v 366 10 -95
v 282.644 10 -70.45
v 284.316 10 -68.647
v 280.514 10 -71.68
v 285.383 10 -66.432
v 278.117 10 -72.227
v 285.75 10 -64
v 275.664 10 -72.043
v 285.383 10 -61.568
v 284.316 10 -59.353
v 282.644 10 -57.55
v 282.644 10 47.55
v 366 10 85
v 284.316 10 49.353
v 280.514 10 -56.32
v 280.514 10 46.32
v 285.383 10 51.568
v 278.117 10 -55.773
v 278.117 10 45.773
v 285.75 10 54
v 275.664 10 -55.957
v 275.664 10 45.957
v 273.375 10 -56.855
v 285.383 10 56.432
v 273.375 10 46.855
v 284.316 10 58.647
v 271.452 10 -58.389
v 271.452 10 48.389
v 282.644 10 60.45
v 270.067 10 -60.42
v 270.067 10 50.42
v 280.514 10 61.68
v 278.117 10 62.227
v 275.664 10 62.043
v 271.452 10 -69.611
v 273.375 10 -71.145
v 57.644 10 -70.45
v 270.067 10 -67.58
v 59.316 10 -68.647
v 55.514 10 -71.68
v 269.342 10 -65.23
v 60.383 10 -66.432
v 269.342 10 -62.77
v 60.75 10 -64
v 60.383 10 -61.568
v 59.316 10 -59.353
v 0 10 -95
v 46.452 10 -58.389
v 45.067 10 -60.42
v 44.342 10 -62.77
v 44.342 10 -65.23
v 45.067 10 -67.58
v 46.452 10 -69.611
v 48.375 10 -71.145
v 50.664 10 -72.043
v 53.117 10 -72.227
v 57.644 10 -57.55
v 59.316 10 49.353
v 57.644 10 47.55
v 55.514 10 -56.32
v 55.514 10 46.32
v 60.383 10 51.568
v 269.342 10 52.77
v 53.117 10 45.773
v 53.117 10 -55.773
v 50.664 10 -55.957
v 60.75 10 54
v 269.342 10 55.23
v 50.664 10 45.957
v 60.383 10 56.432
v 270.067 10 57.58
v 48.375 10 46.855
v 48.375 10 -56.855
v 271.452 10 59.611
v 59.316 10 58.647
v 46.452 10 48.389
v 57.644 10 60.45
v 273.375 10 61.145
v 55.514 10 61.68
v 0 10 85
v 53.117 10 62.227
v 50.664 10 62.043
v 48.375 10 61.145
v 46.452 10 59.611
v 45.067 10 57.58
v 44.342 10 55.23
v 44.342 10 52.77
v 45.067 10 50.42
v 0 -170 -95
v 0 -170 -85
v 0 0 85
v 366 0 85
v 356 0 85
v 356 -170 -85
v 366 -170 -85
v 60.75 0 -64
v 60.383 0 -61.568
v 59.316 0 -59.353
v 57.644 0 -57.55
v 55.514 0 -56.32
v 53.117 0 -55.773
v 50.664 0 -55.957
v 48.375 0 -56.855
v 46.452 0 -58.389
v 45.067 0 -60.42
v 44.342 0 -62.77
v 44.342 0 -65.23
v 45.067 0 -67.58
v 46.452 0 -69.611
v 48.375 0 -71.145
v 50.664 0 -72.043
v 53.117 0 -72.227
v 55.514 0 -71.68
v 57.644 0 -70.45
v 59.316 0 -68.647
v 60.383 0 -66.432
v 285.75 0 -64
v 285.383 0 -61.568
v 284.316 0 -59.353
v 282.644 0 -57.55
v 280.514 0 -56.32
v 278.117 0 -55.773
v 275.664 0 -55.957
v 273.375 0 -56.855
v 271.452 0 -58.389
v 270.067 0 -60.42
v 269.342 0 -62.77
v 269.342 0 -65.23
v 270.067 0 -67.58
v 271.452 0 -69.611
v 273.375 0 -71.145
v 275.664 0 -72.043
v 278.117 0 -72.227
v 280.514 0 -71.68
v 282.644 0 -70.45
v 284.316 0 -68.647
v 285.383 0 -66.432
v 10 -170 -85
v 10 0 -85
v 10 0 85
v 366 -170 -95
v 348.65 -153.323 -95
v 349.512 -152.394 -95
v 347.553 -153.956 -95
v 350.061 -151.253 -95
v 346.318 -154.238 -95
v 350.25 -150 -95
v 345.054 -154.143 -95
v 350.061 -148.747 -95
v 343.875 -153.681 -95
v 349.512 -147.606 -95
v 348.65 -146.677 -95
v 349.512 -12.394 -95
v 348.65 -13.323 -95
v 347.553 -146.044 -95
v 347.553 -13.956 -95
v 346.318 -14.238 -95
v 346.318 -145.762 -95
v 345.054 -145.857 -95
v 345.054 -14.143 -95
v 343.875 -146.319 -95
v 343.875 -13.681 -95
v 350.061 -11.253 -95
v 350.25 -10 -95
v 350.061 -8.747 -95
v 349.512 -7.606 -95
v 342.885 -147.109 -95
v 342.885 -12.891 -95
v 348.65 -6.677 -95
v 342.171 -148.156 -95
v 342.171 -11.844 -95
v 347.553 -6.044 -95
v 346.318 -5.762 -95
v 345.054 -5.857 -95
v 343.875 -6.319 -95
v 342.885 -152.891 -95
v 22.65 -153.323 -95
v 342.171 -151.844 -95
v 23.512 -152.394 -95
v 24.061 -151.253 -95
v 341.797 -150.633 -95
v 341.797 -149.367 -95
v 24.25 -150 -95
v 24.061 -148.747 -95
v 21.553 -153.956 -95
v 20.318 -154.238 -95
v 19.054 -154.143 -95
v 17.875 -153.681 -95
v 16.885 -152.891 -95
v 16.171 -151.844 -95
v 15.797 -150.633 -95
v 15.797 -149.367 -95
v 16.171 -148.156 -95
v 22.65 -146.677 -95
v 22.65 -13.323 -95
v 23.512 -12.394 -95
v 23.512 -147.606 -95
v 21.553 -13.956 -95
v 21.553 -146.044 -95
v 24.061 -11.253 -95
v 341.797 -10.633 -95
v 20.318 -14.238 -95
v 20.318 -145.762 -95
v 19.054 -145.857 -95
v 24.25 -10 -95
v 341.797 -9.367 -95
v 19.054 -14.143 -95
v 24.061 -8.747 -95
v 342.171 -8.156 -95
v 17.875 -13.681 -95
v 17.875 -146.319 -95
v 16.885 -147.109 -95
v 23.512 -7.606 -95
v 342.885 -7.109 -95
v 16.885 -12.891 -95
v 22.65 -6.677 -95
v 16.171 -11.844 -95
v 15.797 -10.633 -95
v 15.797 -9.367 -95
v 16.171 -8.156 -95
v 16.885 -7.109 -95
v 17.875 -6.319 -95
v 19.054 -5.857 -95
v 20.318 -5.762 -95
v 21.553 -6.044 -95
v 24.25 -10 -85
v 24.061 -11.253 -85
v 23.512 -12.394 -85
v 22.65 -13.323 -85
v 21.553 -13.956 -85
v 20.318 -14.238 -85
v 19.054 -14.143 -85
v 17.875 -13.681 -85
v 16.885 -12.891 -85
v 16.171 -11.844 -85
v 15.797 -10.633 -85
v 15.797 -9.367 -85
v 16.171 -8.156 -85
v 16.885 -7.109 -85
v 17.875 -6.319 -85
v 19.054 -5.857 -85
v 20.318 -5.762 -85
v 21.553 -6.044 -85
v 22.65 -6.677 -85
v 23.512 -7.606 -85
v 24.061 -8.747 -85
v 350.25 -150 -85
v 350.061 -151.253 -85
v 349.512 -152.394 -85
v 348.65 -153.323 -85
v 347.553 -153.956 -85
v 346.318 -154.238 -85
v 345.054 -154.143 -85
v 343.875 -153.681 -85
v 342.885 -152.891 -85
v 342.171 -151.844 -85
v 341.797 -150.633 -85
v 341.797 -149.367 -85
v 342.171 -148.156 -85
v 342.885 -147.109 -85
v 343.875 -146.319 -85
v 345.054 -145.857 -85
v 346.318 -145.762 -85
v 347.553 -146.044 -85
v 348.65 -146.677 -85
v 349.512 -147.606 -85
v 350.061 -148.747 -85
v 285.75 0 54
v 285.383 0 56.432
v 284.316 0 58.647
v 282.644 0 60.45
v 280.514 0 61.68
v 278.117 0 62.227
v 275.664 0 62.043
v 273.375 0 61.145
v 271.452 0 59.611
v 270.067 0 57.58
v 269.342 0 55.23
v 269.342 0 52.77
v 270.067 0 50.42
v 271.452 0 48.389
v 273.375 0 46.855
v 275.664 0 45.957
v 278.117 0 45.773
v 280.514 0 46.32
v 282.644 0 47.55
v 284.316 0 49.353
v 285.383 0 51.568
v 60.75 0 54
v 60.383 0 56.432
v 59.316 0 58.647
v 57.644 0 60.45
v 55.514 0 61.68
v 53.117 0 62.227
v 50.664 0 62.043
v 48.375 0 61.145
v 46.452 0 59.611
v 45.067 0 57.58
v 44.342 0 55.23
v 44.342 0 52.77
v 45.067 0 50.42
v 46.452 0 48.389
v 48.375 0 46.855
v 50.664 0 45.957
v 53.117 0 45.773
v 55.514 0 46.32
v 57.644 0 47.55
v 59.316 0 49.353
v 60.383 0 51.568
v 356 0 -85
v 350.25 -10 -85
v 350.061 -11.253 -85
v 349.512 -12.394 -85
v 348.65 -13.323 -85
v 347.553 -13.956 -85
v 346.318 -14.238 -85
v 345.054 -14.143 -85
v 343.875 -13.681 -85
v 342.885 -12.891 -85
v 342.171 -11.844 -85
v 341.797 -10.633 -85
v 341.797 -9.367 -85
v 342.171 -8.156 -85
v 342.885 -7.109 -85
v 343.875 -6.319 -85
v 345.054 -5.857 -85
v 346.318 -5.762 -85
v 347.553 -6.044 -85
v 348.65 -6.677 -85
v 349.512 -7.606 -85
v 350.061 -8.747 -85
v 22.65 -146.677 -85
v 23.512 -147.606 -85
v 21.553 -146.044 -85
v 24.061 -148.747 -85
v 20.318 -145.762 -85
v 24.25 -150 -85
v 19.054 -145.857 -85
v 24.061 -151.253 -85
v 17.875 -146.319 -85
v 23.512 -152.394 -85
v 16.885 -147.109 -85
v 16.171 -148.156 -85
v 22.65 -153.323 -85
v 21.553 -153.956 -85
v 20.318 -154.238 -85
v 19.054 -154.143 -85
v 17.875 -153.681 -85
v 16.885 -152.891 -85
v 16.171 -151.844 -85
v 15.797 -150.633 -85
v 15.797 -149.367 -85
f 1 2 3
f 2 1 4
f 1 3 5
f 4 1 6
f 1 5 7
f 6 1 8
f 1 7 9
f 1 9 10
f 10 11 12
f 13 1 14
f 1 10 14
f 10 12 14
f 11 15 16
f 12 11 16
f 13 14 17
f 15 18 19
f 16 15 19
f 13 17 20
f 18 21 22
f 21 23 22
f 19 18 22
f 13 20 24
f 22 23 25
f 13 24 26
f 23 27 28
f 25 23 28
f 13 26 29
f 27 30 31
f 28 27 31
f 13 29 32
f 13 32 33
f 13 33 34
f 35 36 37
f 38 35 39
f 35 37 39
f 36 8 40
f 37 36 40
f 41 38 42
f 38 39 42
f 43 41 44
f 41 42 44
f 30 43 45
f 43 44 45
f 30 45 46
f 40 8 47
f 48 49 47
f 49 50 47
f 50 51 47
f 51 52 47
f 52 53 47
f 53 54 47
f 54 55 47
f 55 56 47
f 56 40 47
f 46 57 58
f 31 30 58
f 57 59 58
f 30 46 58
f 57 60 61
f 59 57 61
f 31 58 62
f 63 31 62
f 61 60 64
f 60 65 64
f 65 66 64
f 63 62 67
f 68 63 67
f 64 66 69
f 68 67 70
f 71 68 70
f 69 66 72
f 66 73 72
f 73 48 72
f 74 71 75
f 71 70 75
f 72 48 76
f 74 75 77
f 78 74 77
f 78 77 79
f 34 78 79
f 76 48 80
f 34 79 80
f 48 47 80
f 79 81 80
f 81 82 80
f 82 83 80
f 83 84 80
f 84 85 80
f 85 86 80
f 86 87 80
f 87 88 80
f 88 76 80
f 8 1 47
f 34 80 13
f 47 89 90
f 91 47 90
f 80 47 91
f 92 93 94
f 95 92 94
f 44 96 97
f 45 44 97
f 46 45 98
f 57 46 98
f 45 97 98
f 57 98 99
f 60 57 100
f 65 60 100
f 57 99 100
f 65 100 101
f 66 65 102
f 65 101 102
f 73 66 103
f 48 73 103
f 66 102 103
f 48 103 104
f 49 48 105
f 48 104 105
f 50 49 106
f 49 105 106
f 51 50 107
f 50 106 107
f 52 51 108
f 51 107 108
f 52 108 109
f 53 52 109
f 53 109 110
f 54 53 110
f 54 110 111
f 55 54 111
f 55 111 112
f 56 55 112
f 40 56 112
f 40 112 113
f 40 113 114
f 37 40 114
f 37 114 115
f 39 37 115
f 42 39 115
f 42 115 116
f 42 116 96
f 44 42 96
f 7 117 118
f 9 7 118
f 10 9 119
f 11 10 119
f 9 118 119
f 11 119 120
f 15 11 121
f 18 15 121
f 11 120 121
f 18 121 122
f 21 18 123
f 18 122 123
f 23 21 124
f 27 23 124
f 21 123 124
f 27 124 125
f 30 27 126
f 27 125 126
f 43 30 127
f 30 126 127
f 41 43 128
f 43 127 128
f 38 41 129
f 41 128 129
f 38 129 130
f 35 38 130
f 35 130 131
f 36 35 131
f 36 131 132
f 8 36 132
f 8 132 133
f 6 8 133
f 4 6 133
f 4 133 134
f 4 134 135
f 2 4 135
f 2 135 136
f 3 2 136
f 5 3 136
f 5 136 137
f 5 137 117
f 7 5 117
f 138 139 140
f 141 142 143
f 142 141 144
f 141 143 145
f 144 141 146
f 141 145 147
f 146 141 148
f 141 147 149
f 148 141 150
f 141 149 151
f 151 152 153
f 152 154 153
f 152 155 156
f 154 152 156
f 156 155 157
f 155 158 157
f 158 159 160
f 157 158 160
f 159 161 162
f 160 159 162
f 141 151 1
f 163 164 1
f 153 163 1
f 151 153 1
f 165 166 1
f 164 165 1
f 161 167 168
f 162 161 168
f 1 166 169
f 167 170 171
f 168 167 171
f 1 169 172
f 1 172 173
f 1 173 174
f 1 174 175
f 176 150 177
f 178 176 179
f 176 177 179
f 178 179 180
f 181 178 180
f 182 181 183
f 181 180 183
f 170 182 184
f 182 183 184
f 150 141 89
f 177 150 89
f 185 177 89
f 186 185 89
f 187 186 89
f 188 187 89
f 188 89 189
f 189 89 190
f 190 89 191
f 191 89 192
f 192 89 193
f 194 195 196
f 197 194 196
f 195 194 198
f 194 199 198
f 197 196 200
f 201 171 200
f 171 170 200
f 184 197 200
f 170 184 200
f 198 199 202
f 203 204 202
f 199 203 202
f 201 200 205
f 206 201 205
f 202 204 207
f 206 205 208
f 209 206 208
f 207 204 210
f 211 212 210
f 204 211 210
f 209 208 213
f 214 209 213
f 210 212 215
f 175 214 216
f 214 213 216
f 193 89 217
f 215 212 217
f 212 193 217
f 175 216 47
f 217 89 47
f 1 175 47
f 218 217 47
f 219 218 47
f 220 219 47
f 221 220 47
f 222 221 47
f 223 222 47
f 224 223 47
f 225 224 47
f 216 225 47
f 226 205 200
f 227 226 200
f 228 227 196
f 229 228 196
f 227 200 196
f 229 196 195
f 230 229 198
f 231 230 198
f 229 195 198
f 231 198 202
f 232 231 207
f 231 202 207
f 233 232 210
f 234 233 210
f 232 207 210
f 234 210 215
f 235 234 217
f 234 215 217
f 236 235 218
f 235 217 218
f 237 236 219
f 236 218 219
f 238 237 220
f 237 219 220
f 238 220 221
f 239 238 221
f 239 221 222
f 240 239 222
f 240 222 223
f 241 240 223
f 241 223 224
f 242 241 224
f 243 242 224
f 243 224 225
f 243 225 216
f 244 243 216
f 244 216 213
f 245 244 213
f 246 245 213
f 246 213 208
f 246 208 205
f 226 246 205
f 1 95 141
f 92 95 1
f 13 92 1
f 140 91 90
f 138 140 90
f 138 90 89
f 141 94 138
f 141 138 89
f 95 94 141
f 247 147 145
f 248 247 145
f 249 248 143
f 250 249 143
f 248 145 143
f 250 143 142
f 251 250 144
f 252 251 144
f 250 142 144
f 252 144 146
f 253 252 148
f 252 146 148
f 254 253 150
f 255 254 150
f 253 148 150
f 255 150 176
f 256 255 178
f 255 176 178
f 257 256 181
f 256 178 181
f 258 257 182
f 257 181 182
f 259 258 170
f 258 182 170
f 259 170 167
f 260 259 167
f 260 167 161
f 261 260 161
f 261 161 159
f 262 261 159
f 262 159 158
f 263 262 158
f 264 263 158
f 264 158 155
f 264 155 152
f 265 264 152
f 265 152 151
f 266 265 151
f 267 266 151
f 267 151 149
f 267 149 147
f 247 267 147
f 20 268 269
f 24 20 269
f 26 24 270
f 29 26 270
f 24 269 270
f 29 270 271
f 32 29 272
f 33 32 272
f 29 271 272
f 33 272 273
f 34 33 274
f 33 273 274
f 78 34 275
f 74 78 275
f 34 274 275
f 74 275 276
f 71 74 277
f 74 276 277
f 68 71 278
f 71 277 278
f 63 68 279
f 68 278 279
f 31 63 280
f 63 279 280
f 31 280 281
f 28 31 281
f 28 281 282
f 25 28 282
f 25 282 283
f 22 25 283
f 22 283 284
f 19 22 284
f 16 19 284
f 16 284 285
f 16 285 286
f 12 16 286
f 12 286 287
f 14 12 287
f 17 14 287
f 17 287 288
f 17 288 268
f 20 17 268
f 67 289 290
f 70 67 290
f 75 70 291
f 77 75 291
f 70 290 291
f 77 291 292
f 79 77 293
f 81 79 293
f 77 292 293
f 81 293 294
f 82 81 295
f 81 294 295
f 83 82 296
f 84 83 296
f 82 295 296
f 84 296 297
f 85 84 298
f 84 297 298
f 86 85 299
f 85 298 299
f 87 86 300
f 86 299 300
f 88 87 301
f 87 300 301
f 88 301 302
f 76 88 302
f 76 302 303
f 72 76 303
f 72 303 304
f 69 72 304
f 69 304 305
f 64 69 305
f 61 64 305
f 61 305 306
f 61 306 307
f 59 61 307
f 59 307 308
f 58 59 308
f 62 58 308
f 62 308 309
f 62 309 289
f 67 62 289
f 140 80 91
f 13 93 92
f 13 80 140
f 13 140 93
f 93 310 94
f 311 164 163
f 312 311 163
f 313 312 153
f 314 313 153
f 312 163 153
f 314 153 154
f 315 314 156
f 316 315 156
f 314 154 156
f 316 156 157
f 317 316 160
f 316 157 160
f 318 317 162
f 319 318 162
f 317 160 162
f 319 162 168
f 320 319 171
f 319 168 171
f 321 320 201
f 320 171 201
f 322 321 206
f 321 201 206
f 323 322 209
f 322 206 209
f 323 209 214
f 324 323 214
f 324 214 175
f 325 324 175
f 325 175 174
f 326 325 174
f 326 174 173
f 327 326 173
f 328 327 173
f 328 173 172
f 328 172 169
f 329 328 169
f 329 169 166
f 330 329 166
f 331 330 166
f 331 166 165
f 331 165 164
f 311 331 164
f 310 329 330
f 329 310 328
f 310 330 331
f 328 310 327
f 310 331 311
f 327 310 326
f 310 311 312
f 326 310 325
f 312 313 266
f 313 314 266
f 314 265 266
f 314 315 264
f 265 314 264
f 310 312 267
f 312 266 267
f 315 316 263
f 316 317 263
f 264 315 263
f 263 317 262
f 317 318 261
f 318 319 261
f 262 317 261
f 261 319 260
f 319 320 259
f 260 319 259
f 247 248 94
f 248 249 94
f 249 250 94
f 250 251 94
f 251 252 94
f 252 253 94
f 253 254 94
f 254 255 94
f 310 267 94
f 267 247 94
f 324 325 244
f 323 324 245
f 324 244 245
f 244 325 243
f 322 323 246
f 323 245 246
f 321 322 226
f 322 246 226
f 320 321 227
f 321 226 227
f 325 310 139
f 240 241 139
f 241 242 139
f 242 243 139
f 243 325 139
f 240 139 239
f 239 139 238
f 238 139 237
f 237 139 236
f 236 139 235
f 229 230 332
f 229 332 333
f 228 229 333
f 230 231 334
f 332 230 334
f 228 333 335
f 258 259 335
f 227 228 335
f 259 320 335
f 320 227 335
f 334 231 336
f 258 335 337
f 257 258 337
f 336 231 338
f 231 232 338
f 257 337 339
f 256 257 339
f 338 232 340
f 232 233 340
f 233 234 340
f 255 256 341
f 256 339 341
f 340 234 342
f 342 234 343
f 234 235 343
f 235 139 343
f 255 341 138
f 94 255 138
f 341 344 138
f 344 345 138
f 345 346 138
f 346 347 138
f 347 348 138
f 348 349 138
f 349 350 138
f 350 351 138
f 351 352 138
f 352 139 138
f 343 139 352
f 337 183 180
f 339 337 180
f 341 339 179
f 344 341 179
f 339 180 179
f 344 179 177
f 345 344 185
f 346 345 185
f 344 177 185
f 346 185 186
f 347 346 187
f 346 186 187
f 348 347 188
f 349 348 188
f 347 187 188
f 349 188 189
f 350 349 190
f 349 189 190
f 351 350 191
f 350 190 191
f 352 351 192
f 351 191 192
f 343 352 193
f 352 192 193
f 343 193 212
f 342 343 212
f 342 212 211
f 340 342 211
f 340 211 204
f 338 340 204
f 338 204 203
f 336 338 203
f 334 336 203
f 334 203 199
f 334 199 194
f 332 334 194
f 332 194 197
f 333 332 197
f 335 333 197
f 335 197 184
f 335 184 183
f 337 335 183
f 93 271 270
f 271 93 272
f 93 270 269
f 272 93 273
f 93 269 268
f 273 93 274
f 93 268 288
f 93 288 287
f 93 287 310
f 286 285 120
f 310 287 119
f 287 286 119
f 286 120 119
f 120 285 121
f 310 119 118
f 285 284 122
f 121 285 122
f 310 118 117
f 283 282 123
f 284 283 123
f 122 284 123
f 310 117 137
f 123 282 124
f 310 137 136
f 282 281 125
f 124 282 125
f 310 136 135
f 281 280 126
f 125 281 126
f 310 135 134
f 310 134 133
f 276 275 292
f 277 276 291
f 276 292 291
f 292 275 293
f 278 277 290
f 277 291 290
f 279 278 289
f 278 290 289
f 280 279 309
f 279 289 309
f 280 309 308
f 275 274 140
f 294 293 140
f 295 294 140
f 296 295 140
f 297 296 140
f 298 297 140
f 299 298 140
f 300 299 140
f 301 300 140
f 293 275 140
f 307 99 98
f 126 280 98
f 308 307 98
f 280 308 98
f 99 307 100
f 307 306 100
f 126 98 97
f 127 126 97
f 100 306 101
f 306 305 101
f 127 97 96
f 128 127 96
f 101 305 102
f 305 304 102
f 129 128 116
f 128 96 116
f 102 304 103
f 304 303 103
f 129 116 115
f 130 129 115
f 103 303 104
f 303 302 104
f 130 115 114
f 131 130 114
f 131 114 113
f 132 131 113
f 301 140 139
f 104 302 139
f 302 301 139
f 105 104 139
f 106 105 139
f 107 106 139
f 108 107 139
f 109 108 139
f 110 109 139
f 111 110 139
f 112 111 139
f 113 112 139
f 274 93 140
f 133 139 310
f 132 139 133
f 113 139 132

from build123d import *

# Parameters (mm, degrees)
F1_DEPTH  = 366
F2_R      = 8.25
F3_DEPTH  = 10.001
F4_W      = 10
F4_H      = 170
F5_DEPTH  = 170
F8_DEPTH  = 366.001
F9_R      = 4.25
F10_DEPTH = 180.001


with BuildPart() as f1:
    # F0 (on Right) → F1 (new body)
    with BuildSketch(Plane.YZ):
        Polygon((10, -95), (10, 85), (0, 85), (0, -85), (-170, -85), (-170, -95), align=None)
    extrude(amount=F1_DEPTH)

    # F2 (on face) → F3 (cut, through all)
    with BuildSketch(Plane.XZ):
        with Locations((52.5, 54)):
            Circle(F2_R)
        with Locations((277.5, 54)):
            Circle(F2_R)
        with Locations((277.5, -64)):
            Circle(F2_R)
        with Locations((52.5, -64)):
            Circle(F2_R)
    extrude(amount=-F3_DEPTH, mode=Mode.SUBTRACT)

    # F4 (on face) → F5 (join)
    with BuildSketch(Plane.XZ):
        with Locations((5, 0)):
            Rectangle(F4_W, F4_H)
        with Locations((361, 0)):
            Rectangle(F4_W, F4_H)
    extrude(amount=F5_DEPTH)

    # F7 (on face) + F6 (on face) → F8 (cut, through all)
    with BuildSketch(Plane(origin=(0, 0, 0), x_dir=(0, -1, 0), z_dir=(-1, 0, 0))):
        Polygon((170, 85), (0, 85), (170, -85), align=None)
    with BuildSketch(Plane.YZ.offset(366)):
        Polygon((-170, -85), (5, 85), (-170, 85), align=None)
    extrude(amount=-F8_DEPTH, dir=(-1, 0, 0), mode=Mode.SUBTRACT)

    # F9 (on face) → F10 (cut, through all)
    with BuildSketch(Plane(origin=(0, 0, -95), x_dir=(1, 0, 0), z_dir=(0, 0, -1))):
        with Locations((20, 150)):
            Circle(F9_R)
        with Locations((20, 10)):
            Circle(F9_R)
        with Locations((346, 10)):
            Circle(F9_R)
        with Locations((346, 150)):
            Circle(F9_R)
    extrude(amount=-F10_DEPTH, mode=Mode.SUBTRACT)


solid = f1.part
